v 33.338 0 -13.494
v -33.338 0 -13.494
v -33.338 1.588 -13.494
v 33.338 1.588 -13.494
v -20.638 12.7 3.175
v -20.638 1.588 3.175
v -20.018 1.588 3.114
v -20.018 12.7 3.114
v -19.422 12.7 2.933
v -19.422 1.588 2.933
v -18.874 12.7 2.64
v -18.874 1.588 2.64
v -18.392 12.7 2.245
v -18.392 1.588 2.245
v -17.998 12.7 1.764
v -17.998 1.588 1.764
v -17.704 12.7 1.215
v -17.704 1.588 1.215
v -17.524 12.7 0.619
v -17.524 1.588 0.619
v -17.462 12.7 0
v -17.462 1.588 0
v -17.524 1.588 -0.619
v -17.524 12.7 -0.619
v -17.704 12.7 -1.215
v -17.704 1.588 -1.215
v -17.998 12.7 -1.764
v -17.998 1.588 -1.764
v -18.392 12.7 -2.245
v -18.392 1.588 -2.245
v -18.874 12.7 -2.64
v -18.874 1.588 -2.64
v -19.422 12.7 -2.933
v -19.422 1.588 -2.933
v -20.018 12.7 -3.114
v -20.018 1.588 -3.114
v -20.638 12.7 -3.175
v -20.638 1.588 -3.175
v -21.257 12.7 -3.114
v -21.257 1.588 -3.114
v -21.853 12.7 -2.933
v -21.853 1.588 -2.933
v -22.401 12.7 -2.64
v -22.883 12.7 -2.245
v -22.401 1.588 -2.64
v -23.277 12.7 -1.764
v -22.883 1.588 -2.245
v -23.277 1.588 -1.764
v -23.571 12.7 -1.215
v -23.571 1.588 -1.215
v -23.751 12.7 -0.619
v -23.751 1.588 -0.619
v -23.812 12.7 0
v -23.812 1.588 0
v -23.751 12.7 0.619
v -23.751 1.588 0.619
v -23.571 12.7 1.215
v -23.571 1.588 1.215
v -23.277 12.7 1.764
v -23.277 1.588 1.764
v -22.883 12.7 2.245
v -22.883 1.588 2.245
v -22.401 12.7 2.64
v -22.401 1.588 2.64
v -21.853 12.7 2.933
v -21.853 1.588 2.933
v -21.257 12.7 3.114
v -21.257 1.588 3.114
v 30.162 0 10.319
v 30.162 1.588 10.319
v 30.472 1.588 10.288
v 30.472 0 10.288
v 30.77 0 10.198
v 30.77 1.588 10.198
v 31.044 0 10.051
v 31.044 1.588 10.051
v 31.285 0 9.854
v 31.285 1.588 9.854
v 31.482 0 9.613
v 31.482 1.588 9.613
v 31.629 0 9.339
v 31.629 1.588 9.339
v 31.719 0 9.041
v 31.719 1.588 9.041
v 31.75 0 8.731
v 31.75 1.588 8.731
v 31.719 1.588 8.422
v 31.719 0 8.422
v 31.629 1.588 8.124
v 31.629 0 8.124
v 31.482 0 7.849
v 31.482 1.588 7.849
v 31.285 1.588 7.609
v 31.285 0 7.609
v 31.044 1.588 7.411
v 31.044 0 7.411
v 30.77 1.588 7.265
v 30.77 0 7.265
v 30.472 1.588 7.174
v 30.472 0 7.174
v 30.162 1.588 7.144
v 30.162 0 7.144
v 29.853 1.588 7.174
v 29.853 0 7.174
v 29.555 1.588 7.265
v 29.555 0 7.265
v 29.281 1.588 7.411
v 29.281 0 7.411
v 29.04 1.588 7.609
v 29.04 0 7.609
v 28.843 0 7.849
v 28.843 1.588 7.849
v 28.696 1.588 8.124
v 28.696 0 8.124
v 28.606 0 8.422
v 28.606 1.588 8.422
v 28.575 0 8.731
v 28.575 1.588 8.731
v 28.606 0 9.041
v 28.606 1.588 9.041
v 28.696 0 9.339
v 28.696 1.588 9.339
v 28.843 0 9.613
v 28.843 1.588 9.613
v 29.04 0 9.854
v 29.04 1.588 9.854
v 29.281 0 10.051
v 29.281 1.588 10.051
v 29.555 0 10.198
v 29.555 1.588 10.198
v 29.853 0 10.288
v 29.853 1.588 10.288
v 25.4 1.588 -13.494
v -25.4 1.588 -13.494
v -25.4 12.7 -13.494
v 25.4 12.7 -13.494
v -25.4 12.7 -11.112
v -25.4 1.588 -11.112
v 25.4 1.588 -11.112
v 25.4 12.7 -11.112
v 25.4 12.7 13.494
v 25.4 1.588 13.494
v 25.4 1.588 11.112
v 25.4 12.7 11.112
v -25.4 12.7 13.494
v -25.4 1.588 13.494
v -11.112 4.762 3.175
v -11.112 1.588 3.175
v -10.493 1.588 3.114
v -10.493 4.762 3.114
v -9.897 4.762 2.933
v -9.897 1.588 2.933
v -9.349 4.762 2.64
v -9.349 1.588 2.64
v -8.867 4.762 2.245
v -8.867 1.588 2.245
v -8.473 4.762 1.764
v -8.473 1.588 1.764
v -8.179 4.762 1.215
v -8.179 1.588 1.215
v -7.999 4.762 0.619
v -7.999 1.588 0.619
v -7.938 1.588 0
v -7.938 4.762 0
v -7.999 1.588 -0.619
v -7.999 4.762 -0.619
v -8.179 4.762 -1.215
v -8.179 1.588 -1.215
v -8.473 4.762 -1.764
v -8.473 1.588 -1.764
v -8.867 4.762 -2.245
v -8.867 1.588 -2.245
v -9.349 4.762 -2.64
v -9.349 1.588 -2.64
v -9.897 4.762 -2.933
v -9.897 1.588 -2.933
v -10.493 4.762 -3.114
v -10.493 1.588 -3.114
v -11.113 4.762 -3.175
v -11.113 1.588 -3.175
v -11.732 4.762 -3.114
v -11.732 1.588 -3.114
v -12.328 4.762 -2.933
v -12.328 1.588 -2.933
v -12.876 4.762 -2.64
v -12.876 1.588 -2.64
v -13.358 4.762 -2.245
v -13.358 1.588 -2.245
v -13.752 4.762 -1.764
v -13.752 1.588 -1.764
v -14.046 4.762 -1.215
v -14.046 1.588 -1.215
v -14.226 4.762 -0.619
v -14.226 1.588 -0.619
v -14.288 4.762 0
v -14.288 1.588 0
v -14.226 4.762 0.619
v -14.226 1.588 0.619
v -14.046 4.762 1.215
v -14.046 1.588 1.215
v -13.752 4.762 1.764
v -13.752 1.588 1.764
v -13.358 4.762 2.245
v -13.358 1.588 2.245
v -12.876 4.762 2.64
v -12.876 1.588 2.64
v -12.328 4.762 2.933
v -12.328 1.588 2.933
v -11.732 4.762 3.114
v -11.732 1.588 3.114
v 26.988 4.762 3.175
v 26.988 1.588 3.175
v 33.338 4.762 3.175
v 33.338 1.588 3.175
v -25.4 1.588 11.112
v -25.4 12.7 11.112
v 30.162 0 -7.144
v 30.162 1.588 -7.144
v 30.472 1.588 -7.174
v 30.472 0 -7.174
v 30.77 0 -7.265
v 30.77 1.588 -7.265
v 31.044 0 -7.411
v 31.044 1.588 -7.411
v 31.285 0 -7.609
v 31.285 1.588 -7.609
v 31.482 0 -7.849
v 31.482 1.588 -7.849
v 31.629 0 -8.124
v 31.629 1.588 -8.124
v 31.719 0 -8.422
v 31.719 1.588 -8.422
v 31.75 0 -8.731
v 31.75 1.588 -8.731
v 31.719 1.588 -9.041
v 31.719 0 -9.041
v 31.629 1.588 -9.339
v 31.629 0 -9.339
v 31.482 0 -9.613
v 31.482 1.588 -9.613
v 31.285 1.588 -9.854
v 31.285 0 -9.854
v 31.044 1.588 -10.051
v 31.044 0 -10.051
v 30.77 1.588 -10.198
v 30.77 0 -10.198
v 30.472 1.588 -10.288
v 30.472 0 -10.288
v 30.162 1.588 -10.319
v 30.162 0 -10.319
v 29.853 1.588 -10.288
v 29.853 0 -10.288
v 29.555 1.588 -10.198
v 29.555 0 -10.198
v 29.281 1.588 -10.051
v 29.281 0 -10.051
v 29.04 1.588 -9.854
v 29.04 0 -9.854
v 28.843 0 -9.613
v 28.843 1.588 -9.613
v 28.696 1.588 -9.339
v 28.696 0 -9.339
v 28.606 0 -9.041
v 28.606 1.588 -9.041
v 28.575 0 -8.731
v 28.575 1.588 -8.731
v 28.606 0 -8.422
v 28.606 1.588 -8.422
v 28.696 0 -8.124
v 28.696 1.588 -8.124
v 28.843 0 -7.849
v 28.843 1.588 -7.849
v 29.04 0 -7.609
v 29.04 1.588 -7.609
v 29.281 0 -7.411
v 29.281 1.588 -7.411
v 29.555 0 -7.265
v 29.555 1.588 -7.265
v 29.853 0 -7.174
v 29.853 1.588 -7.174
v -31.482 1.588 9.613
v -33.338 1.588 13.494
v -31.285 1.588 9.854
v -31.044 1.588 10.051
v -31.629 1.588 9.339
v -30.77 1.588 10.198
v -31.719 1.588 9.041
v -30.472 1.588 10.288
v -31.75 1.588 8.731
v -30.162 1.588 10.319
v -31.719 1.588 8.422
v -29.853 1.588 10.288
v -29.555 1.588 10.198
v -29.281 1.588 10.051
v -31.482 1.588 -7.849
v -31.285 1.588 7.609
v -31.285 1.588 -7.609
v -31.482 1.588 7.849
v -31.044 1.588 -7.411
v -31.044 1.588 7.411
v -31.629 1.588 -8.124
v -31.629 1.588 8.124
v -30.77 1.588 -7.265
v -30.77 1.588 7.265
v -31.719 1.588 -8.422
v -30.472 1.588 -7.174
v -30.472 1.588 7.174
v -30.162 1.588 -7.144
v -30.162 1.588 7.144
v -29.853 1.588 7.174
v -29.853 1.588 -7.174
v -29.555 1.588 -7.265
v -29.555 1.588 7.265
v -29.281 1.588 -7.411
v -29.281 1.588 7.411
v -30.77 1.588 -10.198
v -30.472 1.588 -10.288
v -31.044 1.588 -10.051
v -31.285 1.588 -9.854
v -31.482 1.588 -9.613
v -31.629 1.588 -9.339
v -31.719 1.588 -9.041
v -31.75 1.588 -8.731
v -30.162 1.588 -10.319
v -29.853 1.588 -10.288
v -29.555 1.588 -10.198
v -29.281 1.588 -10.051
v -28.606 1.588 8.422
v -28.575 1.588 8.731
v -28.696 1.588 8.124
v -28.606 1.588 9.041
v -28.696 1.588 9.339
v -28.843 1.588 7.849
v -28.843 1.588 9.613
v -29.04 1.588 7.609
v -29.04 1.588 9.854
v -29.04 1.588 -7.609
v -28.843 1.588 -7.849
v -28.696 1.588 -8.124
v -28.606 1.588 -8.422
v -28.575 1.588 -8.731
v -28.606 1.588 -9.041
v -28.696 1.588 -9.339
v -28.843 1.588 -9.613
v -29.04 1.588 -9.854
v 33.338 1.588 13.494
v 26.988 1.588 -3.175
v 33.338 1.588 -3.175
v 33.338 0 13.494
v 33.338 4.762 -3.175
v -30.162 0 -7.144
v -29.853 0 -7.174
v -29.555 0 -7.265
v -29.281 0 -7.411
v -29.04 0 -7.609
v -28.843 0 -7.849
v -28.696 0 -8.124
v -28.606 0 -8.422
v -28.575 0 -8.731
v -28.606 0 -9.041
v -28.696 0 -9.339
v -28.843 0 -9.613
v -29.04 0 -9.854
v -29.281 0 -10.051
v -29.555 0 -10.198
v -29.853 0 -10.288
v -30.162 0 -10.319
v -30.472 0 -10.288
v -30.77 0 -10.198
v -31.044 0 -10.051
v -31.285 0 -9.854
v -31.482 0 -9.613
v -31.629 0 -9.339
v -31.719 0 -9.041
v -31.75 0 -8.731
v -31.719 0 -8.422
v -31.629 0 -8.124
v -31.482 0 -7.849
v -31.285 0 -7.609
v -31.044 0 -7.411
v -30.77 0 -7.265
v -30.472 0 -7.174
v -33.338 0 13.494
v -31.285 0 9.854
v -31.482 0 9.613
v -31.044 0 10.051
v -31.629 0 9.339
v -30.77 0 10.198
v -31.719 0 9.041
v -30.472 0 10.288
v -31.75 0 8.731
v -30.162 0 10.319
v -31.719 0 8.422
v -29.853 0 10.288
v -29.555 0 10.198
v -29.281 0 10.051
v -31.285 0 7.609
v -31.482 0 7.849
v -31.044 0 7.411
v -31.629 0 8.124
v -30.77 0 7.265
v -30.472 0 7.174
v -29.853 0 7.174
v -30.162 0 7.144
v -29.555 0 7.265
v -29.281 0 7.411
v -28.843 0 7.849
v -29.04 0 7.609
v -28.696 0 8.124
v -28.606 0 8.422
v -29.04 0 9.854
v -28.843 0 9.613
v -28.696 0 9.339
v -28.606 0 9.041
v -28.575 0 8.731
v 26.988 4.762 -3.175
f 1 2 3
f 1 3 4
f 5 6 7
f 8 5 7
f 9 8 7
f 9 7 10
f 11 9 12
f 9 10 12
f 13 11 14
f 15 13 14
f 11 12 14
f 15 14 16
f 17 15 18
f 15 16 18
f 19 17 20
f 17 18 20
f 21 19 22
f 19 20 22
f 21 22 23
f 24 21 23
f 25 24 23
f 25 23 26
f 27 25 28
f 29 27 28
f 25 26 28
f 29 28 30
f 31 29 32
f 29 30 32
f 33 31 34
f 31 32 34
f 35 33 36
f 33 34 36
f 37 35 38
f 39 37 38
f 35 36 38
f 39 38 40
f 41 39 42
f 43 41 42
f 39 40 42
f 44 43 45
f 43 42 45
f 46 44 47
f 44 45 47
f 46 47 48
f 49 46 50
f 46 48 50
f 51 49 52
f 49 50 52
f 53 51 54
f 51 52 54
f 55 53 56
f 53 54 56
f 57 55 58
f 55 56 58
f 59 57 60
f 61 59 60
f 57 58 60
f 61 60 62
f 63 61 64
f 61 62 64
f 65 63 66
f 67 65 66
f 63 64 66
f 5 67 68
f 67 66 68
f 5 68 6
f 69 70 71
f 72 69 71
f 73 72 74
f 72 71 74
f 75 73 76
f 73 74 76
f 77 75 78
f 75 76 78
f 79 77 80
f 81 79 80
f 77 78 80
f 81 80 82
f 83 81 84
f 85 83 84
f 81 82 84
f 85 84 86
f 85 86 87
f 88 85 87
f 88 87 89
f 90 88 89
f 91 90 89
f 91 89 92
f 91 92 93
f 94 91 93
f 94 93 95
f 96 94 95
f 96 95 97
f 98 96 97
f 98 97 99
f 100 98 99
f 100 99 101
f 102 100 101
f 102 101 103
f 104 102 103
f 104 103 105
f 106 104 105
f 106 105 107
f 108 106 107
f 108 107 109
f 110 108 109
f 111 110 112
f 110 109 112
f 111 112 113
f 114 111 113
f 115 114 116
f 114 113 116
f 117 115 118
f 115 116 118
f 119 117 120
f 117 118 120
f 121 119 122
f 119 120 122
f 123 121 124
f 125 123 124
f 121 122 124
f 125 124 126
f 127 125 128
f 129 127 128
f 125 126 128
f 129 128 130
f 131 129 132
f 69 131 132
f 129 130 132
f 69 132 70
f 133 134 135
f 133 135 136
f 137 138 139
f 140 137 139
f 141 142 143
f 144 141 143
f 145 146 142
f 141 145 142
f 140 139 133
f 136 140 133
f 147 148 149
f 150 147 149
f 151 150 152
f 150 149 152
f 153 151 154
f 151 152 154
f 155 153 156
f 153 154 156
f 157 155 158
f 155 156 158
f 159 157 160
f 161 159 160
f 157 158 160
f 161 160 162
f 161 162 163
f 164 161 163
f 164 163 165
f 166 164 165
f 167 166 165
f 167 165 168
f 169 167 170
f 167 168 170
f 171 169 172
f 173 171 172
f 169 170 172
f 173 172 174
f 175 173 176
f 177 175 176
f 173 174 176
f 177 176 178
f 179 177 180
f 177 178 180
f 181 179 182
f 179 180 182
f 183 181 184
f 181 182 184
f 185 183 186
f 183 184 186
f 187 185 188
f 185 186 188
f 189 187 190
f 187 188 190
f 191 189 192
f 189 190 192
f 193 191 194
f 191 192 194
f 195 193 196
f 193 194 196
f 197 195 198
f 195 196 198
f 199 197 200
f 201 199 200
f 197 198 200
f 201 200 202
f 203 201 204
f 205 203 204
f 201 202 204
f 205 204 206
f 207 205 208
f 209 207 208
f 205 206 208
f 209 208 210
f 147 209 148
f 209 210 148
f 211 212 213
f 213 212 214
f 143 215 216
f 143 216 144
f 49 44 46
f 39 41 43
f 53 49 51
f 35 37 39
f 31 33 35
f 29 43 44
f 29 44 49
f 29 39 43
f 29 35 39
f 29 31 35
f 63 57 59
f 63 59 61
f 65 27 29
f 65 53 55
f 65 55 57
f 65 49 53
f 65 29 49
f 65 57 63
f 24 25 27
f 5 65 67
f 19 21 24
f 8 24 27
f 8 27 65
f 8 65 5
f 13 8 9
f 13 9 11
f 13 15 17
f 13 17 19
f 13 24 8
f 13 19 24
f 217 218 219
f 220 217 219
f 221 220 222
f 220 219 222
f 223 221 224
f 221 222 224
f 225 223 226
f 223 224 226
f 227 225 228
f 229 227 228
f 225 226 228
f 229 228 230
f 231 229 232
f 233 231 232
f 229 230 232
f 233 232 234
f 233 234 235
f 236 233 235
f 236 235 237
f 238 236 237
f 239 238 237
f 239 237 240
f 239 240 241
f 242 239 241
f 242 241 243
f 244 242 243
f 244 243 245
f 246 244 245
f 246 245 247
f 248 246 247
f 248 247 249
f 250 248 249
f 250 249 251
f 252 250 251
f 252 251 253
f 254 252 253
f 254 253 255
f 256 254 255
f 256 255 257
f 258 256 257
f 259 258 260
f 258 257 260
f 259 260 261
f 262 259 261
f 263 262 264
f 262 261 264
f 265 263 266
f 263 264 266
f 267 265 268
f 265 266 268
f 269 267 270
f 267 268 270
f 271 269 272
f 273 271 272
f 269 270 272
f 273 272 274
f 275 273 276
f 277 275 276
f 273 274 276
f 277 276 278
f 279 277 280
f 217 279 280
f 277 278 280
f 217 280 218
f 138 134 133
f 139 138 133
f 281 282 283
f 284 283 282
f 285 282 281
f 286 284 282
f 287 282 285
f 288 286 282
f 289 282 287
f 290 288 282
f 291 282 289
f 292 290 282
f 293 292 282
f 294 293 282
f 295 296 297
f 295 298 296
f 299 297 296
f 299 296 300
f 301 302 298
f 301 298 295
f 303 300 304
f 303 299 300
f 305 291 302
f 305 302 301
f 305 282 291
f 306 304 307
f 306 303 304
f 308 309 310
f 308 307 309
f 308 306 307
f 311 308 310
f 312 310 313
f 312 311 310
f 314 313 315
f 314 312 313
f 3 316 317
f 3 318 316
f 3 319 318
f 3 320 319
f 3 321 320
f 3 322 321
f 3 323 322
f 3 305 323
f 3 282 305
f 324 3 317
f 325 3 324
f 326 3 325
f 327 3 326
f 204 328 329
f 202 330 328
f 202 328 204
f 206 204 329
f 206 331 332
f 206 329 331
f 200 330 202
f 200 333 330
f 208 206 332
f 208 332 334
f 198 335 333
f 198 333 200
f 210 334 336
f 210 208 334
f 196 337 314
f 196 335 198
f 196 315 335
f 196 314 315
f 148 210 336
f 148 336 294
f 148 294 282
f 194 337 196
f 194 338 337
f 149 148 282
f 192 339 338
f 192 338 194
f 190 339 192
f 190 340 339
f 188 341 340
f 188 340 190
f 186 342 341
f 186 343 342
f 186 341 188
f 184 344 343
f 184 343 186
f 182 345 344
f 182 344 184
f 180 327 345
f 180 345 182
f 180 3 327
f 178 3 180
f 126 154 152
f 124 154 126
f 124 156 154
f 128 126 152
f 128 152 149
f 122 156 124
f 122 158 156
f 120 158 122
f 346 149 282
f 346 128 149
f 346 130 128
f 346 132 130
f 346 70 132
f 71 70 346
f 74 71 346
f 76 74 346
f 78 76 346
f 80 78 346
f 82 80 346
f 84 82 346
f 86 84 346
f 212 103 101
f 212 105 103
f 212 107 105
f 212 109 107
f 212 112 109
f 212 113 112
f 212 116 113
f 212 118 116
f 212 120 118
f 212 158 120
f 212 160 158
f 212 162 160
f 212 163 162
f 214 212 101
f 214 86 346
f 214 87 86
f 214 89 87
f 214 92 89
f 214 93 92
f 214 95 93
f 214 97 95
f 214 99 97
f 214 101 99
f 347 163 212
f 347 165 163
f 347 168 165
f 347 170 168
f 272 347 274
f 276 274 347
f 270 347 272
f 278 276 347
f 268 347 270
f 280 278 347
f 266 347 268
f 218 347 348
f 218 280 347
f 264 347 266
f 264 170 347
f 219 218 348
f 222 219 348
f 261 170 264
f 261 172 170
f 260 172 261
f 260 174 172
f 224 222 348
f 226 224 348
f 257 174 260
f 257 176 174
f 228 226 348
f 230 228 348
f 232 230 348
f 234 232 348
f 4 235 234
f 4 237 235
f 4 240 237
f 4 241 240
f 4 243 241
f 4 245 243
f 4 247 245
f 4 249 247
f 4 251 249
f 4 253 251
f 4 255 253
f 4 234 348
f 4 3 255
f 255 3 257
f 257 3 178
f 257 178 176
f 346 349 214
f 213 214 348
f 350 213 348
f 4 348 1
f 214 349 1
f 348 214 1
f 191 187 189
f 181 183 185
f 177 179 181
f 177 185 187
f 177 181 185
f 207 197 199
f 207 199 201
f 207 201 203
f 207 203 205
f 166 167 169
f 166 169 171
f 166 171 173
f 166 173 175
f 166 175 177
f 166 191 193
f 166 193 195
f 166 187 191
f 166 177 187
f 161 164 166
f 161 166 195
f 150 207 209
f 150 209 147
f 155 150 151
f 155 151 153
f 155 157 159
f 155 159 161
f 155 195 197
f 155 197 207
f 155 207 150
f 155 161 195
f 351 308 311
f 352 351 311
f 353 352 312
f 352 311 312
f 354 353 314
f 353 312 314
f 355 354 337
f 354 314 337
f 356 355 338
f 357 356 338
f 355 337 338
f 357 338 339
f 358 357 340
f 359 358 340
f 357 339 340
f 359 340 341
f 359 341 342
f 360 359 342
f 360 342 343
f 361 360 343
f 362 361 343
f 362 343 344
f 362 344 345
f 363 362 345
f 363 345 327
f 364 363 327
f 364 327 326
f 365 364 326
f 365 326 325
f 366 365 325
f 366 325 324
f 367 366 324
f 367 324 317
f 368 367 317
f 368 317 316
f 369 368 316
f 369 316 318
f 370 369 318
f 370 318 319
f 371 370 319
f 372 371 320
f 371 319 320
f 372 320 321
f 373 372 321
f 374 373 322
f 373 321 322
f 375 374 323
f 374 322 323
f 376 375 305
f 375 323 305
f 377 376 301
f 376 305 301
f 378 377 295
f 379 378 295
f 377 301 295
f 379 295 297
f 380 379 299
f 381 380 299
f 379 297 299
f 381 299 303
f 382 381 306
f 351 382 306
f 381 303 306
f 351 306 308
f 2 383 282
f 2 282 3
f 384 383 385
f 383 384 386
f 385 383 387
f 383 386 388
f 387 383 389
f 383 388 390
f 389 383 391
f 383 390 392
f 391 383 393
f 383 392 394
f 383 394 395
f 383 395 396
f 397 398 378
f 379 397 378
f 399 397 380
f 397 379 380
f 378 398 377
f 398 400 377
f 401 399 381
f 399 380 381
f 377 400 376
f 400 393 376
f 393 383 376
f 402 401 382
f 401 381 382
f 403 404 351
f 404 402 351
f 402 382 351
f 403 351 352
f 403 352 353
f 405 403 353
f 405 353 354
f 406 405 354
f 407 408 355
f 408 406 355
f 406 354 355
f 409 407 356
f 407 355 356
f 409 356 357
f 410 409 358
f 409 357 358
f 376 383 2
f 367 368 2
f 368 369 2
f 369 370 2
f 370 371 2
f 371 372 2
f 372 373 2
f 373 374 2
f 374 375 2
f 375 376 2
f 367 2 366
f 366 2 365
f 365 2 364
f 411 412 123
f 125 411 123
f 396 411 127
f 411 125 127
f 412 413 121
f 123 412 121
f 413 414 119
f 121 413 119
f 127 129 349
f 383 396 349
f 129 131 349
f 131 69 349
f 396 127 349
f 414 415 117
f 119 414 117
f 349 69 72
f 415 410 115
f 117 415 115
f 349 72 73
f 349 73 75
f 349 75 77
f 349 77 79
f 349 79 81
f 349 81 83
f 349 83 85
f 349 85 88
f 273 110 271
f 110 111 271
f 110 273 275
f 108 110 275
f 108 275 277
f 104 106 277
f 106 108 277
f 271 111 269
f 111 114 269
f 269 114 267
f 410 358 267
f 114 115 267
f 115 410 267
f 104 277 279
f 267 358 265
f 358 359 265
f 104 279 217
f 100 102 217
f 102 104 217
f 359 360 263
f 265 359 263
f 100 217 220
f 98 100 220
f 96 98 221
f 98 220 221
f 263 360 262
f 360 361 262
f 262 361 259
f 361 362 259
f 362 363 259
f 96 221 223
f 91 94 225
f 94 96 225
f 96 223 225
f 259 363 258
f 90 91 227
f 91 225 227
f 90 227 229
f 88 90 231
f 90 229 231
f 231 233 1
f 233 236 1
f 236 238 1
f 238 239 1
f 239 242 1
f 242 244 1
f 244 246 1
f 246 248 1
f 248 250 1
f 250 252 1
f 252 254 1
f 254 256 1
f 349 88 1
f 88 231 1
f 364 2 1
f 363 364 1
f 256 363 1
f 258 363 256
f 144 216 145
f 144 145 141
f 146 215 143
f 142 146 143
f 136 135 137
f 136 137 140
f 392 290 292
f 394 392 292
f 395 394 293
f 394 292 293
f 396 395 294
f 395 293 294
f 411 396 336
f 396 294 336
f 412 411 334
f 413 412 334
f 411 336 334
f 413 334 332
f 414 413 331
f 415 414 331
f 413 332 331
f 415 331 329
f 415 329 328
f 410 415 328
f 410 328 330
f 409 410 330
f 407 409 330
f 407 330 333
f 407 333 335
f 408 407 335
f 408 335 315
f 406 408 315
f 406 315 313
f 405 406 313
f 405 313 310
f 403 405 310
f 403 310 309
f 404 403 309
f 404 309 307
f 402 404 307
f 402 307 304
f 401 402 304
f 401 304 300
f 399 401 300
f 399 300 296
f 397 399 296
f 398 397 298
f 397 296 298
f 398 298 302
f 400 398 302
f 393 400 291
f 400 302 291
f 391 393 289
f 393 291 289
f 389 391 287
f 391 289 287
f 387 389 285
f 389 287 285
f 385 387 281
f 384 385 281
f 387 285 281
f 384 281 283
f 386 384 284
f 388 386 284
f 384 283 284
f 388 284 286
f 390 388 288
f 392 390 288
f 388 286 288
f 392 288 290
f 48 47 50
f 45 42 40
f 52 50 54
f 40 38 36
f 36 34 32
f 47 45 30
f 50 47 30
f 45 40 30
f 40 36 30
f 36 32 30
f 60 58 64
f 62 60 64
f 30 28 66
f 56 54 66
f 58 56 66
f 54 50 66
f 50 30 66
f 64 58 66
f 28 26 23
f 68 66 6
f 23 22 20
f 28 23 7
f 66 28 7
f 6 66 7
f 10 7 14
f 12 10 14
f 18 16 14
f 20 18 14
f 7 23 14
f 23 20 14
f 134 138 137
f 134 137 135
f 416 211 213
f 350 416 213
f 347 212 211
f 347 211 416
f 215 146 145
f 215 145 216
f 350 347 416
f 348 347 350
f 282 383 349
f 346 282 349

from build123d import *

# Parameters (mm, degrees)
SKETCH1_W             = 66.675
SKETCH1_H             = 26.9875
BOSS_EXTRUDE1_DEPTH   = 1.5875
SKETCH2_R             = 3.175
BOSS_EXTRUDE2_DEPTH   = 11.1125
SKETCH2_W             = 50.8
SKETCH2_H             = 2.38125
BOSS_EXTRUDE2_2_DEPTH = 11.1125
BOSS_EXTRUDE2_3_DEPTH = 11.1125
SKETCH3_R             = 3.175
SKETCH3_W             = 6.35
SKETCH3_H             = 6.35
BOSS_EXTRUDE3_DEPTH   = 3.175
SKETCH4_R             = 1.5875
CUT_EXTRUDE1_DEPTH    = 38.642500602


with BuildPart() as part:
    # Sketch1 → Boss-Extrude1 (new body)
    with BuildSketch(Plane(origin=(0, 0, 0), x_dir=(1, 0, 0), z_dir=(0, 1, 0))):
        Rectangle(SKETCH1_W, SKETCH1_H)
    extrude(amount=BOSS_EXTRUDE1_DEPTH)

    # Sketch3 → Boss-Extrude3 (add)
    with BuildSketch(Plane(origin=(0, 1.5875, 0), x_dir=(1, 0, 0), z_dir=(0, 1, 0))):
        with Locations(Location((-11.1125, 0, 0), (0, 0, 270))):
            Circle(SKETCH3_R)
        with Locations((30.1625, 0)):
            Rectangle(SKETCH3_W, SKETCH3_H)
    extrude(amount=BOSS_EXTRUDE3_DEPTH)

    # Sketch4 → Cut-Extrude1 (cut, through all)
    with BuildSketch(Plane(origin=(0, 1.5875, 0), x_dir=(1, 0, 0), z_dir=(0, 1, 0))):
        with Locations(Location((30.1625, -8.73125, 0), (0, 0, 270))):
            Circle(SKETCH4_R)
        with Locations(Location((30.1625, 8.73125, 0), (0, 0, 270))):
            Circle(SKETCH4_R)
        with Locations(Location((-30.1625, 8.73125, 0), (0, 0, 270))):
            Circle(SKETCH4_R)
        with Locations(Location((-30.1625, -8.73125, 0), (0, 0, 270))):
            Circle(SKETCH4_R)
    extrude(amount=-CUT_EXTRUDE1_DEPTH, mode=Mode.SUBTRACT)


with BuildPart() as body_2:
    # Sketch2 → Boss-Extrude2 (new body)
    with BuildSketch(Plane(origin=(0, 1.5875, 0), x_dir=(1, 0, 0), z_dir=(0, 1, 0))):
        with Locations(Location((-20.6375, 0, 0), (0, 0, 270))):
            Circle(SKETCH2_R)
    extrude(amount=BOSS_EXTRUDE2_DEPTH)


with BuildPart() as body_3:
    # Sketch2 → Boss-Extrude2 2 (new body)
    with BuildSketch(Plane(origin=(0, 1.5875, 0), x_dir=(1, 0, 0), z_dir=(0, 1, 0))):
        with Locations((0, 12.303125)):
            Rectangle(SKETCH2_W, SKETCH2_H)
    extrude(amount=BOSS_EXTRUDE2_2_DEPTH)


with BuildPart() as body_4:
    # Sketch2 → Boss-Extrude2 3 (new body)
    with BuildSketch(Plane(origin=(0, 1.5875, 0), x_dir=(1, 0, 0), z_dir=(0, 1, 0))):
        with Locations((0, -12.303125)):
            Rectangle(SKETCH2_W, SKETCH2_H)
    extrude(amount=BOSS_EXTRUDE2_3_DEPTH)


solid = Compound([part.part, body_2.part, body_3.part, body_4.part])
